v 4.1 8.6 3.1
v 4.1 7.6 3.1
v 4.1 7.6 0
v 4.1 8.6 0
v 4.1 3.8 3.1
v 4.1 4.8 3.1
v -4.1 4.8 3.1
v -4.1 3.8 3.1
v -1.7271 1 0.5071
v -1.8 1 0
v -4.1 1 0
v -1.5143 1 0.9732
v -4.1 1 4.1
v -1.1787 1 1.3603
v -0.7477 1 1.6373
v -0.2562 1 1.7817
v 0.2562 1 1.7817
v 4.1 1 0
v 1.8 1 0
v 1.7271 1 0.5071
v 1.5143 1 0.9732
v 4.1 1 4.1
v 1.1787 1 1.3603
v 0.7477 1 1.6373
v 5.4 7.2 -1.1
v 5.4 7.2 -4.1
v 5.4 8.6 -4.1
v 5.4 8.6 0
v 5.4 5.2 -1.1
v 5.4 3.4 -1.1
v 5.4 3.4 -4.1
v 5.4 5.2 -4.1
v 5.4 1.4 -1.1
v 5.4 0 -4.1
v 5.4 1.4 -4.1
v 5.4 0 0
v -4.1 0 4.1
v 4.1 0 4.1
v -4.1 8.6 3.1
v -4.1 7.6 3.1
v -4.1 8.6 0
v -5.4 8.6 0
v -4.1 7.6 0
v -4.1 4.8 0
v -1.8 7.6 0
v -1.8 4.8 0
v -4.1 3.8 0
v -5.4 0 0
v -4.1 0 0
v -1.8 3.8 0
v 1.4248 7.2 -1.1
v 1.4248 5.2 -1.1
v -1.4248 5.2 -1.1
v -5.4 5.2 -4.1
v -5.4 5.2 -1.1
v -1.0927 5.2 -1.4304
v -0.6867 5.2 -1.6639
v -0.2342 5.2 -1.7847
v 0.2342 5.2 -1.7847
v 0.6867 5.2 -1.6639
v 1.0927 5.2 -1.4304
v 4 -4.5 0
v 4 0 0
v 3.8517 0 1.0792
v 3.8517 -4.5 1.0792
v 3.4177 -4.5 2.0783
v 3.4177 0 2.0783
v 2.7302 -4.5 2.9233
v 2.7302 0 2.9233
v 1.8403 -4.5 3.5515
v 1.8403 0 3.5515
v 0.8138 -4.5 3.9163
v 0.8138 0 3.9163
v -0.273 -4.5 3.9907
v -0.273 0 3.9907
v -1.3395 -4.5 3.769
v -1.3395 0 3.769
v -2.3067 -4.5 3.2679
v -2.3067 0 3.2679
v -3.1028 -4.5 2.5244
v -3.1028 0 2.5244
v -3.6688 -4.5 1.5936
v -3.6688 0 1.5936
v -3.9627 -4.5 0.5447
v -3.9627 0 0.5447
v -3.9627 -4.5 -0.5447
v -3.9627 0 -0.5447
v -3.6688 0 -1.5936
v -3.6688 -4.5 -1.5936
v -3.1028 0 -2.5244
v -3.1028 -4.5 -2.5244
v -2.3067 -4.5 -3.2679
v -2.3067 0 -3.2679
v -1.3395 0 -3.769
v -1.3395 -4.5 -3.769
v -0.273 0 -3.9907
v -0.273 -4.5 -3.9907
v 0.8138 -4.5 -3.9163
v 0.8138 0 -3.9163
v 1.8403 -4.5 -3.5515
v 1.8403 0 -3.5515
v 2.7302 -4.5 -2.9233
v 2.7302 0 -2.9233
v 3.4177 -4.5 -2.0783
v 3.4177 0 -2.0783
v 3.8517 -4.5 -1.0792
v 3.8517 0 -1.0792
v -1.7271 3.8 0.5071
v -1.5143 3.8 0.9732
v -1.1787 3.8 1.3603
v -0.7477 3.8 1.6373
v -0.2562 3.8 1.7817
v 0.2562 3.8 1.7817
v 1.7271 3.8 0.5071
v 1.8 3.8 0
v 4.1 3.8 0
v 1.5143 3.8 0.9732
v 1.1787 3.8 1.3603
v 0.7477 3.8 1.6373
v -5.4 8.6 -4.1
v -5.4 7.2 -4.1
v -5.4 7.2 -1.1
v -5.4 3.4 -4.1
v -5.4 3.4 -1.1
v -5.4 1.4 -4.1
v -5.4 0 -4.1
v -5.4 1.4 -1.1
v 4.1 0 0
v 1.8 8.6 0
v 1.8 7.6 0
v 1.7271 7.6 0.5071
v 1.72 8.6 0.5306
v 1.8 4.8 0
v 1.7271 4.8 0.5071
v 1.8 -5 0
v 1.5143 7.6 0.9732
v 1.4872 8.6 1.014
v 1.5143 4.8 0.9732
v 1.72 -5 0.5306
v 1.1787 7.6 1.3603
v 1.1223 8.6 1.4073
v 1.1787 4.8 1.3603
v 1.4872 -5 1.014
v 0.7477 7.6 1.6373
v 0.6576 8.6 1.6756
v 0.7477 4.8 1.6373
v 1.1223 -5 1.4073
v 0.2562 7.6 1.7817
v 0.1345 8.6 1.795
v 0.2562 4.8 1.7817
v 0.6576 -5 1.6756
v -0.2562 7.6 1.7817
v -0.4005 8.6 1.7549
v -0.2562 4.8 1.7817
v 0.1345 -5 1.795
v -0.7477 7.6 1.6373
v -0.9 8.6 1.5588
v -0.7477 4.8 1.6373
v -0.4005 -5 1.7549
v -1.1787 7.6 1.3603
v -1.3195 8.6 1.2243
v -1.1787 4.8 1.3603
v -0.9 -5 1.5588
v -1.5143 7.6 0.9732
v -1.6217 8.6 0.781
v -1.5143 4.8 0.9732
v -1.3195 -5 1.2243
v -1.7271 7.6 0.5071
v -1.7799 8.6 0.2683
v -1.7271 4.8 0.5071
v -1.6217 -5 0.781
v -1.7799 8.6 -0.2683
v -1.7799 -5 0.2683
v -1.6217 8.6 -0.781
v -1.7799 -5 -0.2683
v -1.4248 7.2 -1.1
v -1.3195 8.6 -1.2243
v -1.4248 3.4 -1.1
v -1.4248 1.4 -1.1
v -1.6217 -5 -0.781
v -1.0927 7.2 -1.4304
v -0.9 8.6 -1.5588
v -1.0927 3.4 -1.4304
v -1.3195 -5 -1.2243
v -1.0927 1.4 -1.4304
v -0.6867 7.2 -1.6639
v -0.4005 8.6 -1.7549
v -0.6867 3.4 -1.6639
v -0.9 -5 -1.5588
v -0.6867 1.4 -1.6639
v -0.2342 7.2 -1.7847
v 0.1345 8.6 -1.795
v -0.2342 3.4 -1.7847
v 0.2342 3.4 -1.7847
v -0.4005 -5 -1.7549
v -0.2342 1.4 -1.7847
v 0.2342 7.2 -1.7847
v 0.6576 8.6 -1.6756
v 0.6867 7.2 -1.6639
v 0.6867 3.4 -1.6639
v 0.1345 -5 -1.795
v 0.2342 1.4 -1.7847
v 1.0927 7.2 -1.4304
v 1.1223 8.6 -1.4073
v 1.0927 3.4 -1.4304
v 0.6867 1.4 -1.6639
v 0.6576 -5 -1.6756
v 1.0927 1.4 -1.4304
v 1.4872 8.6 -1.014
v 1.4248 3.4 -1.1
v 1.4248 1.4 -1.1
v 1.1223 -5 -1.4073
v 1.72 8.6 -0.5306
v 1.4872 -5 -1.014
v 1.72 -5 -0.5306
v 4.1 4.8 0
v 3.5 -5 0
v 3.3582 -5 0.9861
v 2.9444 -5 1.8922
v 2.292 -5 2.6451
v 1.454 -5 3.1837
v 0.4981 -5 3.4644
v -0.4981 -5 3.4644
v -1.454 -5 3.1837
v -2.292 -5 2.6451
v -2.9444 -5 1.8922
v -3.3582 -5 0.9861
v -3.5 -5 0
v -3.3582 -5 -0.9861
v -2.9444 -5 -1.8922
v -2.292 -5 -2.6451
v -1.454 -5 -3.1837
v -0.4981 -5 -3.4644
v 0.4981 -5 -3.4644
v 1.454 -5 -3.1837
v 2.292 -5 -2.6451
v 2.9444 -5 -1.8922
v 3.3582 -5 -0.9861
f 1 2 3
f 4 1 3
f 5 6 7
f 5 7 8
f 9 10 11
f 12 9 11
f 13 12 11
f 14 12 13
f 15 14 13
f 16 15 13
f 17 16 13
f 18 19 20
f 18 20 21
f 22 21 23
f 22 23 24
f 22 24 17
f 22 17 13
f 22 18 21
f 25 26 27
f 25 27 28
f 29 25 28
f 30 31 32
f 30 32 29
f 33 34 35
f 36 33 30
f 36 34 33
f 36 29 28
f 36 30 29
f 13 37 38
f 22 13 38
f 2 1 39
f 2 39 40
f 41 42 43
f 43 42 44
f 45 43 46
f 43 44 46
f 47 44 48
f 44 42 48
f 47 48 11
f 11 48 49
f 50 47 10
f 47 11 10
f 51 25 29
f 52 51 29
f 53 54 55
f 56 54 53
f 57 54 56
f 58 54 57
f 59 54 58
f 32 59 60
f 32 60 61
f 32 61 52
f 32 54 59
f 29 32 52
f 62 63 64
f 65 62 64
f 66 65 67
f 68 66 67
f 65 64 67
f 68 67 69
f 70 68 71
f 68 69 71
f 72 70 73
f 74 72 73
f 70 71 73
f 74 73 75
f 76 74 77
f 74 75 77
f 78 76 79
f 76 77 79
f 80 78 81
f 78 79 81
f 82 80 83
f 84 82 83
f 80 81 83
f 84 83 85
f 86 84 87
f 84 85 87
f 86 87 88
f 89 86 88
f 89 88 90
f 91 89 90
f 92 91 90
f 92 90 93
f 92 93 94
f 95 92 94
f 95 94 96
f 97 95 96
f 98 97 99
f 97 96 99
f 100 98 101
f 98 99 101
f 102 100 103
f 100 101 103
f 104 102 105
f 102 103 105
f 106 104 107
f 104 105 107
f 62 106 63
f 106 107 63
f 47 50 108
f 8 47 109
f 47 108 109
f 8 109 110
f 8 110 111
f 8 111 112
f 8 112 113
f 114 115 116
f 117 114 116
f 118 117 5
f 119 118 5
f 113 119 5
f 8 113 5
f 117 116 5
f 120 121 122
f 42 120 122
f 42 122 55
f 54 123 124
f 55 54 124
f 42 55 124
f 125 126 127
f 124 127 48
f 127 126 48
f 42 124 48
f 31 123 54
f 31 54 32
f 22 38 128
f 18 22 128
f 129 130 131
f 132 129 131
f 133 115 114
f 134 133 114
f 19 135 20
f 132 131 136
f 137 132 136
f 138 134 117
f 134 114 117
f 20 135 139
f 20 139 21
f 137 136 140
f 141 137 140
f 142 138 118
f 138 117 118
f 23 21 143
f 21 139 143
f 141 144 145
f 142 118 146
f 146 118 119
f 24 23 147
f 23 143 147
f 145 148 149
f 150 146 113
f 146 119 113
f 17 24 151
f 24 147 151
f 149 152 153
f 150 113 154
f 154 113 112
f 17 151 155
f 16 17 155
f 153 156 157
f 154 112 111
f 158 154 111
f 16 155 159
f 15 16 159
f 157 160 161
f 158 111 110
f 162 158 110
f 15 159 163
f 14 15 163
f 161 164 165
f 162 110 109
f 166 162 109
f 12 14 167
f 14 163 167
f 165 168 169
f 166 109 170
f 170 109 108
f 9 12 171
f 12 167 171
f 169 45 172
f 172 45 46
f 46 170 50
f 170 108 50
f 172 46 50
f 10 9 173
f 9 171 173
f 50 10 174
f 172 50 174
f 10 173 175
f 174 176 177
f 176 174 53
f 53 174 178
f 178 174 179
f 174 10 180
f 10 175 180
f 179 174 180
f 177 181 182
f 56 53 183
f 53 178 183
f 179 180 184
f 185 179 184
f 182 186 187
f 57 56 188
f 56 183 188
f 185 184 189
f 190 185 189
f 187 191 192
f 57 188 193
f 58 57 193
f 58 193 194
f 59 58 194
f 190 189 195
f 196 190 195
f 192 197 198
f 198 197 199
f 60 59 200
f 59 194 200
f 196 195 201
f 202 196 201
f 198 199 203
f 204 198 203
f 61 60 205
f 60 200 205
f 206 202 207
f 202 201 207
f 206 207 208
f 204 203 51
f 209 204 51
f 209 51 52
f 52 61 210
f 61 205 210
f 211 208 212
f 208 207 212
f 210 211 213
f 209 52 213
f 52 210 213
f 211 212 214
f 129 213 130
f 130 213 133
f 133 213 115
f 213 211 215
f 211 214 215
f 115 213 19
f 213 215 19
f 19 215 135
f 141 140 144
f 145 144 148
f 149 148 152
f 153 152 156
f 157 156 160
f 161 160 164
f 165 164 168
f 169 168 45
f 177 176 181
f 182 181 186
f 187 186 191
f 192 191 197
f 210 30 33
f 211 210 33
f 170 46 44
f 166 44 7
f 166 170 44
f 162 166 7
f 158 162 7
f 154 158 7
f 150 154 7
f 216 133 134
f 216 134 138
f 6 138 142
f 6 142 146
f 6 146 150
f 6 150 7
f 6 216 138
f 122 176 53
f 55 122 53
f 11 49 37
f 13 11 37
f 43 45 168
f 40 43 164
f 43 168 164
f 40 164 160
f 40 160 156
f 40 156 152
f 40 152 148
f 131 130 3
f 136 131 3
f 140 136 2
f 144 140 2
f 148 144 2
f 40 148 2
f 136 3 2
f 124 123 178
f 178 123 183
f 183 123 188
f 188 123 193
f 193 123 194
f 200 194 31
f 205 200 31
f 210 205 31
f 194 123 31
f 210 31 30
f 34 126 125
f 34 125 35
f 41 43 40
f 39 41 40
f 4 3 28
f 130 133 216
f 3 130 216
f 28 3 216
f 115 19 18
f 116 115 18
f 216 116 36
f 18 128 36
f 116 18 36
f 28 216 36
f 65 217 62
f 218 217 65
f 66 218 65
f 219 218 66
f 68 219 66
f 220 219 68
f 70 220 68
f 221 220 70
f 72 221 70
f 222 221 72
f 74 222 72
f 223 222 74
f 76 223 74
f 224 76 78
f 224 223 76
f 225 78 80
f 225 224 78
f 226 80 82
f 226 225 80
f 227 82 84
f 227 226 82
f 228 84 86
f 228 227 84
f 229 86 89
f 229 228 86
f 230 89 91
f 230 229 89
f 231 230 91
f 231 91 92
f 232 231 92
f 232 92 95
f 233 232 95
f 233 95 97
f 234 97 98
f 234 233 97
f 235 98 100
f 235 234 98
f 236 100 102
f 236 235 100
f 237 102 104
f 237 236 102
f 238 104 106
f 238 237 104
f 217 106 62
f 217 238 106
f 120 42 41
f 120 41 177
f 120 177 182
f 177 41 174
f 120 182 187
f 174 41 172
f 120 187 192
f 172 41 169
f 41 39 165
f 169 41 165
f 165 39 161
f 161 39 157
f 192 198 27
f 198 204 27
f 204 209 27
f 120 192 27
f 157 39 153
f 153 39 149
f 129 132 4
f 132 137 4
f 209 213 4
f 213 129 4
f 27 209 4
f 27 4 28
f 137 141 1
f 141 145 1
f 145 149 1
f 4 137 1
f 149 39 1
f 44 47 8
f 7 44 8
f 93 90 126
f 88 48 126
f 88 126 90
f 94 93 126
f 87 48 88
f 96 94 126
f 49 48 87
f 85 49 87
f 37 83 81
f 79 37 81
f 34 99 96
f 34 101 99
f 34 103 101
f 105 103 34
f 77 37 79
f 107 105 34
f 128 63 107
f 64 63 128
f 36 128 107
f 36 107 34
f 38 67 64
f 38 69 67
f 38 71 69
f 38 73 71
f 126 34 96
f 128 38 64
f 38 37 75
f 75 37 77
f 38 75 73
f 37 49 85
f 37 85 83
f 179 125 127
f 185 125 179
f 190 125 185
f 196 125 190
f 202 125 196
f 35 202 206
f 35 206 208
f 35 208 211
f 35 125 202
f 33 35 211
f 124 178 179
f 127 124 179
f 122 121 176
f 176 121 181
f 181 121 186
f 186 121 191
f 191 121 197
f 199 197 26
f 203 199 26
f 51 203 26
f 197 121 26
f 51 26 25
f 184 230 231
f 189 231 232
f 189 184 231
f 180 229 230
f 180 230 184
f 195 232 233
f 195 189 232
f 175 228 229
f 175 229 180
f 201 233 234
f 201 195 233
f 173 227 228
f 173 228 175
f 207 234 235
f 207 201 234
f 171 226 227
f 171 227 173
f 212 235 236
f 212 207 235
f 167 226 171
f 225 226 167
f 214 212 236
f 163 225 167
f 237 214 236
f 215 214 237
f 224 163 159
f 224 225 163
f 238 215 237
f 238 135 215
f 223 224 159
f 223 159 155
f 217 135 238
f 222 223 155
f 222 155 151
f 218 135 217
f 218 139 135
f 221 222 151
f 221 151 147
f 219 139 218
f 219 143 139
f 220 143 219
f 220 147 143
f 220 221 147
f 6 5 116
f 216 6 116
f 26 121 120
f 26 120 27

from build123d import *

# Parameters (mm, degrees)
SKETCH_W               = 10.8
SKETCH_H               = 8.2
PAD_DEPTH              = 8.6
SKETCH001_W            = 3
SKETCH001_H            = 2
POCKET_DEPTH           = 10.801
LINEARPATTERN_COUNT    = 2
LINEARPATTERN_PITCH    = 3.8
POCKET001_DEPTH        = 8.601
SKETCH003_W            = 4.1
SKETCH003_H            = 2.8
POCKET002_DEPTH        = 9.501
LINEARPATTERN001_COUNT = 2
LINEARPATTERN001_PITCH = 3.8
SKETCH004_W            = 1
SKETCH004_H            = 7.6
POCKET003_DEPTH        = 9.501
SKETCH005_R            = 1.8
POCKET004_DEPTH        = 8.601
SKETCH006_R            = 4
PAD001_DEPTH           = 5
SKETCH007_R            = 1.8
POCKET005_DEPTH        = 5
CHAMFER_SIZE           = 0.5


with BuildPart() as part:
    # Sketch → Pad (new body)
    with BuildSketch(Plane.XZ):
        Rectangle(SKETCH_W, SKETCH_H)
    extrude(amount=-PAD_DEPTH)

    # Sketch001 (on Face2 of Pad) → Pocket (cut, through all)
    with BuildSketch(Plane(origin=(5.4, 0, 0), x_dir=(0, 0, 1), z_dir=(1, 0, 0))):
        with Locations((-2.6, -2.4)):
            Rectangle(SKETCH001_W, SKETCH001_H)
    pocket = extrude(amount=-POCKET_DEPTH, mode=Mode.SUBTRACT)

    # LinearPattern: Pocket ×2
    with Locations(*[(0, i * LINEARPATTERN_PITCH, 0) for i in range(1, LINEARPATTERN_COUNT)]):
        add(pocket, mode=Mode.SUBTRACT)

    # Sketch002 (on Face4 of LinearPattern) → Pocket001 (cut, through all)
    with BuildSketch(Plane.XZ):
        Polygon((-5.4, 0), (-4.1, 0), (-4.1, 4.1), (4.1, 4.1), (4.1, 0), (5.4, 0), (5.4, 5), (-5.4, 5), align=None)
    extrude(amount=-POCKET001_DEPTH, mode=Mode.SUBTRACT)

    # Sketch003 (on Face3 of Pocket001) → Pocket002 (cut, through all)
    with BuildSketch(Plane(origin=(4.1, 0, 0), x_dir=(0, 0, 1), z_dir=(1, 0, 0))):
        with Locations((2.05, -2.4)):
            Rectangle(SKETCH003_W, SKETCH003_H)
    pocket002 = extrude(amount=-POCKET002_DEPTH, mode=Mode.SUBTRACT)

    # LinearPattern001: Pocket002 ×2
    with Locations(*[(0, i * LINEARPATTERN001_PITCH, 0) for i in range(1, LINEARPATTERN001_COUNT)]):
        add(pocket002, mode=Mode.SUBTRACT)

    # Sketch004 (on Face25 of LinearPattern001) → Pocket003 (cut, through all)
    with BuildSketch(Plane(origin=(4.1, 0, 0), x_dir=(0, 0, 1), z_dir=(1, 0, 0))):
        with Locations((3.6, -4.8)):
            Rectangle(SKETCH004_W, SKETCH004_H)
    extrude(amount=-POCKET003_DEPTH, mode=Mode.SUBTRACT)

    # Sketch005 (on Face2 of Pocket003) → Pocket004 (cut, through all)
    with BuildSketch(Plane.XZ):
        Circle(SKETCH005_R)
    extrude(amount=-POCKET004_DEPTH, mode=Mode.SUBTRACT)

    # Sketch006 (on Face2 of Pocket004) → Pad001 (join)
    with BuildSketch(Plane.XZ):
        Circle(SKETCH006_R)
    extrude(amount=PAD001_DEPTH)

    # Sketch007 (on Face32 of Pad001) → Pocket005 (cut)
    with BuildSketch(Plane.XZ.offset(5)):
        Circle(SKETCH007_R)
    extrude(amount=-POCKET005_DEPTH, mode=Mode.SUBTRACT)

    # Chamfer
    chamfer_edges = [part.edges().sort_by_distance(p)[0] for p in [
        (-4, -5, 0),
    ]]
    chamfer(chamfer_edges, length=CHAMFER_SIZE)


solid = part.part
